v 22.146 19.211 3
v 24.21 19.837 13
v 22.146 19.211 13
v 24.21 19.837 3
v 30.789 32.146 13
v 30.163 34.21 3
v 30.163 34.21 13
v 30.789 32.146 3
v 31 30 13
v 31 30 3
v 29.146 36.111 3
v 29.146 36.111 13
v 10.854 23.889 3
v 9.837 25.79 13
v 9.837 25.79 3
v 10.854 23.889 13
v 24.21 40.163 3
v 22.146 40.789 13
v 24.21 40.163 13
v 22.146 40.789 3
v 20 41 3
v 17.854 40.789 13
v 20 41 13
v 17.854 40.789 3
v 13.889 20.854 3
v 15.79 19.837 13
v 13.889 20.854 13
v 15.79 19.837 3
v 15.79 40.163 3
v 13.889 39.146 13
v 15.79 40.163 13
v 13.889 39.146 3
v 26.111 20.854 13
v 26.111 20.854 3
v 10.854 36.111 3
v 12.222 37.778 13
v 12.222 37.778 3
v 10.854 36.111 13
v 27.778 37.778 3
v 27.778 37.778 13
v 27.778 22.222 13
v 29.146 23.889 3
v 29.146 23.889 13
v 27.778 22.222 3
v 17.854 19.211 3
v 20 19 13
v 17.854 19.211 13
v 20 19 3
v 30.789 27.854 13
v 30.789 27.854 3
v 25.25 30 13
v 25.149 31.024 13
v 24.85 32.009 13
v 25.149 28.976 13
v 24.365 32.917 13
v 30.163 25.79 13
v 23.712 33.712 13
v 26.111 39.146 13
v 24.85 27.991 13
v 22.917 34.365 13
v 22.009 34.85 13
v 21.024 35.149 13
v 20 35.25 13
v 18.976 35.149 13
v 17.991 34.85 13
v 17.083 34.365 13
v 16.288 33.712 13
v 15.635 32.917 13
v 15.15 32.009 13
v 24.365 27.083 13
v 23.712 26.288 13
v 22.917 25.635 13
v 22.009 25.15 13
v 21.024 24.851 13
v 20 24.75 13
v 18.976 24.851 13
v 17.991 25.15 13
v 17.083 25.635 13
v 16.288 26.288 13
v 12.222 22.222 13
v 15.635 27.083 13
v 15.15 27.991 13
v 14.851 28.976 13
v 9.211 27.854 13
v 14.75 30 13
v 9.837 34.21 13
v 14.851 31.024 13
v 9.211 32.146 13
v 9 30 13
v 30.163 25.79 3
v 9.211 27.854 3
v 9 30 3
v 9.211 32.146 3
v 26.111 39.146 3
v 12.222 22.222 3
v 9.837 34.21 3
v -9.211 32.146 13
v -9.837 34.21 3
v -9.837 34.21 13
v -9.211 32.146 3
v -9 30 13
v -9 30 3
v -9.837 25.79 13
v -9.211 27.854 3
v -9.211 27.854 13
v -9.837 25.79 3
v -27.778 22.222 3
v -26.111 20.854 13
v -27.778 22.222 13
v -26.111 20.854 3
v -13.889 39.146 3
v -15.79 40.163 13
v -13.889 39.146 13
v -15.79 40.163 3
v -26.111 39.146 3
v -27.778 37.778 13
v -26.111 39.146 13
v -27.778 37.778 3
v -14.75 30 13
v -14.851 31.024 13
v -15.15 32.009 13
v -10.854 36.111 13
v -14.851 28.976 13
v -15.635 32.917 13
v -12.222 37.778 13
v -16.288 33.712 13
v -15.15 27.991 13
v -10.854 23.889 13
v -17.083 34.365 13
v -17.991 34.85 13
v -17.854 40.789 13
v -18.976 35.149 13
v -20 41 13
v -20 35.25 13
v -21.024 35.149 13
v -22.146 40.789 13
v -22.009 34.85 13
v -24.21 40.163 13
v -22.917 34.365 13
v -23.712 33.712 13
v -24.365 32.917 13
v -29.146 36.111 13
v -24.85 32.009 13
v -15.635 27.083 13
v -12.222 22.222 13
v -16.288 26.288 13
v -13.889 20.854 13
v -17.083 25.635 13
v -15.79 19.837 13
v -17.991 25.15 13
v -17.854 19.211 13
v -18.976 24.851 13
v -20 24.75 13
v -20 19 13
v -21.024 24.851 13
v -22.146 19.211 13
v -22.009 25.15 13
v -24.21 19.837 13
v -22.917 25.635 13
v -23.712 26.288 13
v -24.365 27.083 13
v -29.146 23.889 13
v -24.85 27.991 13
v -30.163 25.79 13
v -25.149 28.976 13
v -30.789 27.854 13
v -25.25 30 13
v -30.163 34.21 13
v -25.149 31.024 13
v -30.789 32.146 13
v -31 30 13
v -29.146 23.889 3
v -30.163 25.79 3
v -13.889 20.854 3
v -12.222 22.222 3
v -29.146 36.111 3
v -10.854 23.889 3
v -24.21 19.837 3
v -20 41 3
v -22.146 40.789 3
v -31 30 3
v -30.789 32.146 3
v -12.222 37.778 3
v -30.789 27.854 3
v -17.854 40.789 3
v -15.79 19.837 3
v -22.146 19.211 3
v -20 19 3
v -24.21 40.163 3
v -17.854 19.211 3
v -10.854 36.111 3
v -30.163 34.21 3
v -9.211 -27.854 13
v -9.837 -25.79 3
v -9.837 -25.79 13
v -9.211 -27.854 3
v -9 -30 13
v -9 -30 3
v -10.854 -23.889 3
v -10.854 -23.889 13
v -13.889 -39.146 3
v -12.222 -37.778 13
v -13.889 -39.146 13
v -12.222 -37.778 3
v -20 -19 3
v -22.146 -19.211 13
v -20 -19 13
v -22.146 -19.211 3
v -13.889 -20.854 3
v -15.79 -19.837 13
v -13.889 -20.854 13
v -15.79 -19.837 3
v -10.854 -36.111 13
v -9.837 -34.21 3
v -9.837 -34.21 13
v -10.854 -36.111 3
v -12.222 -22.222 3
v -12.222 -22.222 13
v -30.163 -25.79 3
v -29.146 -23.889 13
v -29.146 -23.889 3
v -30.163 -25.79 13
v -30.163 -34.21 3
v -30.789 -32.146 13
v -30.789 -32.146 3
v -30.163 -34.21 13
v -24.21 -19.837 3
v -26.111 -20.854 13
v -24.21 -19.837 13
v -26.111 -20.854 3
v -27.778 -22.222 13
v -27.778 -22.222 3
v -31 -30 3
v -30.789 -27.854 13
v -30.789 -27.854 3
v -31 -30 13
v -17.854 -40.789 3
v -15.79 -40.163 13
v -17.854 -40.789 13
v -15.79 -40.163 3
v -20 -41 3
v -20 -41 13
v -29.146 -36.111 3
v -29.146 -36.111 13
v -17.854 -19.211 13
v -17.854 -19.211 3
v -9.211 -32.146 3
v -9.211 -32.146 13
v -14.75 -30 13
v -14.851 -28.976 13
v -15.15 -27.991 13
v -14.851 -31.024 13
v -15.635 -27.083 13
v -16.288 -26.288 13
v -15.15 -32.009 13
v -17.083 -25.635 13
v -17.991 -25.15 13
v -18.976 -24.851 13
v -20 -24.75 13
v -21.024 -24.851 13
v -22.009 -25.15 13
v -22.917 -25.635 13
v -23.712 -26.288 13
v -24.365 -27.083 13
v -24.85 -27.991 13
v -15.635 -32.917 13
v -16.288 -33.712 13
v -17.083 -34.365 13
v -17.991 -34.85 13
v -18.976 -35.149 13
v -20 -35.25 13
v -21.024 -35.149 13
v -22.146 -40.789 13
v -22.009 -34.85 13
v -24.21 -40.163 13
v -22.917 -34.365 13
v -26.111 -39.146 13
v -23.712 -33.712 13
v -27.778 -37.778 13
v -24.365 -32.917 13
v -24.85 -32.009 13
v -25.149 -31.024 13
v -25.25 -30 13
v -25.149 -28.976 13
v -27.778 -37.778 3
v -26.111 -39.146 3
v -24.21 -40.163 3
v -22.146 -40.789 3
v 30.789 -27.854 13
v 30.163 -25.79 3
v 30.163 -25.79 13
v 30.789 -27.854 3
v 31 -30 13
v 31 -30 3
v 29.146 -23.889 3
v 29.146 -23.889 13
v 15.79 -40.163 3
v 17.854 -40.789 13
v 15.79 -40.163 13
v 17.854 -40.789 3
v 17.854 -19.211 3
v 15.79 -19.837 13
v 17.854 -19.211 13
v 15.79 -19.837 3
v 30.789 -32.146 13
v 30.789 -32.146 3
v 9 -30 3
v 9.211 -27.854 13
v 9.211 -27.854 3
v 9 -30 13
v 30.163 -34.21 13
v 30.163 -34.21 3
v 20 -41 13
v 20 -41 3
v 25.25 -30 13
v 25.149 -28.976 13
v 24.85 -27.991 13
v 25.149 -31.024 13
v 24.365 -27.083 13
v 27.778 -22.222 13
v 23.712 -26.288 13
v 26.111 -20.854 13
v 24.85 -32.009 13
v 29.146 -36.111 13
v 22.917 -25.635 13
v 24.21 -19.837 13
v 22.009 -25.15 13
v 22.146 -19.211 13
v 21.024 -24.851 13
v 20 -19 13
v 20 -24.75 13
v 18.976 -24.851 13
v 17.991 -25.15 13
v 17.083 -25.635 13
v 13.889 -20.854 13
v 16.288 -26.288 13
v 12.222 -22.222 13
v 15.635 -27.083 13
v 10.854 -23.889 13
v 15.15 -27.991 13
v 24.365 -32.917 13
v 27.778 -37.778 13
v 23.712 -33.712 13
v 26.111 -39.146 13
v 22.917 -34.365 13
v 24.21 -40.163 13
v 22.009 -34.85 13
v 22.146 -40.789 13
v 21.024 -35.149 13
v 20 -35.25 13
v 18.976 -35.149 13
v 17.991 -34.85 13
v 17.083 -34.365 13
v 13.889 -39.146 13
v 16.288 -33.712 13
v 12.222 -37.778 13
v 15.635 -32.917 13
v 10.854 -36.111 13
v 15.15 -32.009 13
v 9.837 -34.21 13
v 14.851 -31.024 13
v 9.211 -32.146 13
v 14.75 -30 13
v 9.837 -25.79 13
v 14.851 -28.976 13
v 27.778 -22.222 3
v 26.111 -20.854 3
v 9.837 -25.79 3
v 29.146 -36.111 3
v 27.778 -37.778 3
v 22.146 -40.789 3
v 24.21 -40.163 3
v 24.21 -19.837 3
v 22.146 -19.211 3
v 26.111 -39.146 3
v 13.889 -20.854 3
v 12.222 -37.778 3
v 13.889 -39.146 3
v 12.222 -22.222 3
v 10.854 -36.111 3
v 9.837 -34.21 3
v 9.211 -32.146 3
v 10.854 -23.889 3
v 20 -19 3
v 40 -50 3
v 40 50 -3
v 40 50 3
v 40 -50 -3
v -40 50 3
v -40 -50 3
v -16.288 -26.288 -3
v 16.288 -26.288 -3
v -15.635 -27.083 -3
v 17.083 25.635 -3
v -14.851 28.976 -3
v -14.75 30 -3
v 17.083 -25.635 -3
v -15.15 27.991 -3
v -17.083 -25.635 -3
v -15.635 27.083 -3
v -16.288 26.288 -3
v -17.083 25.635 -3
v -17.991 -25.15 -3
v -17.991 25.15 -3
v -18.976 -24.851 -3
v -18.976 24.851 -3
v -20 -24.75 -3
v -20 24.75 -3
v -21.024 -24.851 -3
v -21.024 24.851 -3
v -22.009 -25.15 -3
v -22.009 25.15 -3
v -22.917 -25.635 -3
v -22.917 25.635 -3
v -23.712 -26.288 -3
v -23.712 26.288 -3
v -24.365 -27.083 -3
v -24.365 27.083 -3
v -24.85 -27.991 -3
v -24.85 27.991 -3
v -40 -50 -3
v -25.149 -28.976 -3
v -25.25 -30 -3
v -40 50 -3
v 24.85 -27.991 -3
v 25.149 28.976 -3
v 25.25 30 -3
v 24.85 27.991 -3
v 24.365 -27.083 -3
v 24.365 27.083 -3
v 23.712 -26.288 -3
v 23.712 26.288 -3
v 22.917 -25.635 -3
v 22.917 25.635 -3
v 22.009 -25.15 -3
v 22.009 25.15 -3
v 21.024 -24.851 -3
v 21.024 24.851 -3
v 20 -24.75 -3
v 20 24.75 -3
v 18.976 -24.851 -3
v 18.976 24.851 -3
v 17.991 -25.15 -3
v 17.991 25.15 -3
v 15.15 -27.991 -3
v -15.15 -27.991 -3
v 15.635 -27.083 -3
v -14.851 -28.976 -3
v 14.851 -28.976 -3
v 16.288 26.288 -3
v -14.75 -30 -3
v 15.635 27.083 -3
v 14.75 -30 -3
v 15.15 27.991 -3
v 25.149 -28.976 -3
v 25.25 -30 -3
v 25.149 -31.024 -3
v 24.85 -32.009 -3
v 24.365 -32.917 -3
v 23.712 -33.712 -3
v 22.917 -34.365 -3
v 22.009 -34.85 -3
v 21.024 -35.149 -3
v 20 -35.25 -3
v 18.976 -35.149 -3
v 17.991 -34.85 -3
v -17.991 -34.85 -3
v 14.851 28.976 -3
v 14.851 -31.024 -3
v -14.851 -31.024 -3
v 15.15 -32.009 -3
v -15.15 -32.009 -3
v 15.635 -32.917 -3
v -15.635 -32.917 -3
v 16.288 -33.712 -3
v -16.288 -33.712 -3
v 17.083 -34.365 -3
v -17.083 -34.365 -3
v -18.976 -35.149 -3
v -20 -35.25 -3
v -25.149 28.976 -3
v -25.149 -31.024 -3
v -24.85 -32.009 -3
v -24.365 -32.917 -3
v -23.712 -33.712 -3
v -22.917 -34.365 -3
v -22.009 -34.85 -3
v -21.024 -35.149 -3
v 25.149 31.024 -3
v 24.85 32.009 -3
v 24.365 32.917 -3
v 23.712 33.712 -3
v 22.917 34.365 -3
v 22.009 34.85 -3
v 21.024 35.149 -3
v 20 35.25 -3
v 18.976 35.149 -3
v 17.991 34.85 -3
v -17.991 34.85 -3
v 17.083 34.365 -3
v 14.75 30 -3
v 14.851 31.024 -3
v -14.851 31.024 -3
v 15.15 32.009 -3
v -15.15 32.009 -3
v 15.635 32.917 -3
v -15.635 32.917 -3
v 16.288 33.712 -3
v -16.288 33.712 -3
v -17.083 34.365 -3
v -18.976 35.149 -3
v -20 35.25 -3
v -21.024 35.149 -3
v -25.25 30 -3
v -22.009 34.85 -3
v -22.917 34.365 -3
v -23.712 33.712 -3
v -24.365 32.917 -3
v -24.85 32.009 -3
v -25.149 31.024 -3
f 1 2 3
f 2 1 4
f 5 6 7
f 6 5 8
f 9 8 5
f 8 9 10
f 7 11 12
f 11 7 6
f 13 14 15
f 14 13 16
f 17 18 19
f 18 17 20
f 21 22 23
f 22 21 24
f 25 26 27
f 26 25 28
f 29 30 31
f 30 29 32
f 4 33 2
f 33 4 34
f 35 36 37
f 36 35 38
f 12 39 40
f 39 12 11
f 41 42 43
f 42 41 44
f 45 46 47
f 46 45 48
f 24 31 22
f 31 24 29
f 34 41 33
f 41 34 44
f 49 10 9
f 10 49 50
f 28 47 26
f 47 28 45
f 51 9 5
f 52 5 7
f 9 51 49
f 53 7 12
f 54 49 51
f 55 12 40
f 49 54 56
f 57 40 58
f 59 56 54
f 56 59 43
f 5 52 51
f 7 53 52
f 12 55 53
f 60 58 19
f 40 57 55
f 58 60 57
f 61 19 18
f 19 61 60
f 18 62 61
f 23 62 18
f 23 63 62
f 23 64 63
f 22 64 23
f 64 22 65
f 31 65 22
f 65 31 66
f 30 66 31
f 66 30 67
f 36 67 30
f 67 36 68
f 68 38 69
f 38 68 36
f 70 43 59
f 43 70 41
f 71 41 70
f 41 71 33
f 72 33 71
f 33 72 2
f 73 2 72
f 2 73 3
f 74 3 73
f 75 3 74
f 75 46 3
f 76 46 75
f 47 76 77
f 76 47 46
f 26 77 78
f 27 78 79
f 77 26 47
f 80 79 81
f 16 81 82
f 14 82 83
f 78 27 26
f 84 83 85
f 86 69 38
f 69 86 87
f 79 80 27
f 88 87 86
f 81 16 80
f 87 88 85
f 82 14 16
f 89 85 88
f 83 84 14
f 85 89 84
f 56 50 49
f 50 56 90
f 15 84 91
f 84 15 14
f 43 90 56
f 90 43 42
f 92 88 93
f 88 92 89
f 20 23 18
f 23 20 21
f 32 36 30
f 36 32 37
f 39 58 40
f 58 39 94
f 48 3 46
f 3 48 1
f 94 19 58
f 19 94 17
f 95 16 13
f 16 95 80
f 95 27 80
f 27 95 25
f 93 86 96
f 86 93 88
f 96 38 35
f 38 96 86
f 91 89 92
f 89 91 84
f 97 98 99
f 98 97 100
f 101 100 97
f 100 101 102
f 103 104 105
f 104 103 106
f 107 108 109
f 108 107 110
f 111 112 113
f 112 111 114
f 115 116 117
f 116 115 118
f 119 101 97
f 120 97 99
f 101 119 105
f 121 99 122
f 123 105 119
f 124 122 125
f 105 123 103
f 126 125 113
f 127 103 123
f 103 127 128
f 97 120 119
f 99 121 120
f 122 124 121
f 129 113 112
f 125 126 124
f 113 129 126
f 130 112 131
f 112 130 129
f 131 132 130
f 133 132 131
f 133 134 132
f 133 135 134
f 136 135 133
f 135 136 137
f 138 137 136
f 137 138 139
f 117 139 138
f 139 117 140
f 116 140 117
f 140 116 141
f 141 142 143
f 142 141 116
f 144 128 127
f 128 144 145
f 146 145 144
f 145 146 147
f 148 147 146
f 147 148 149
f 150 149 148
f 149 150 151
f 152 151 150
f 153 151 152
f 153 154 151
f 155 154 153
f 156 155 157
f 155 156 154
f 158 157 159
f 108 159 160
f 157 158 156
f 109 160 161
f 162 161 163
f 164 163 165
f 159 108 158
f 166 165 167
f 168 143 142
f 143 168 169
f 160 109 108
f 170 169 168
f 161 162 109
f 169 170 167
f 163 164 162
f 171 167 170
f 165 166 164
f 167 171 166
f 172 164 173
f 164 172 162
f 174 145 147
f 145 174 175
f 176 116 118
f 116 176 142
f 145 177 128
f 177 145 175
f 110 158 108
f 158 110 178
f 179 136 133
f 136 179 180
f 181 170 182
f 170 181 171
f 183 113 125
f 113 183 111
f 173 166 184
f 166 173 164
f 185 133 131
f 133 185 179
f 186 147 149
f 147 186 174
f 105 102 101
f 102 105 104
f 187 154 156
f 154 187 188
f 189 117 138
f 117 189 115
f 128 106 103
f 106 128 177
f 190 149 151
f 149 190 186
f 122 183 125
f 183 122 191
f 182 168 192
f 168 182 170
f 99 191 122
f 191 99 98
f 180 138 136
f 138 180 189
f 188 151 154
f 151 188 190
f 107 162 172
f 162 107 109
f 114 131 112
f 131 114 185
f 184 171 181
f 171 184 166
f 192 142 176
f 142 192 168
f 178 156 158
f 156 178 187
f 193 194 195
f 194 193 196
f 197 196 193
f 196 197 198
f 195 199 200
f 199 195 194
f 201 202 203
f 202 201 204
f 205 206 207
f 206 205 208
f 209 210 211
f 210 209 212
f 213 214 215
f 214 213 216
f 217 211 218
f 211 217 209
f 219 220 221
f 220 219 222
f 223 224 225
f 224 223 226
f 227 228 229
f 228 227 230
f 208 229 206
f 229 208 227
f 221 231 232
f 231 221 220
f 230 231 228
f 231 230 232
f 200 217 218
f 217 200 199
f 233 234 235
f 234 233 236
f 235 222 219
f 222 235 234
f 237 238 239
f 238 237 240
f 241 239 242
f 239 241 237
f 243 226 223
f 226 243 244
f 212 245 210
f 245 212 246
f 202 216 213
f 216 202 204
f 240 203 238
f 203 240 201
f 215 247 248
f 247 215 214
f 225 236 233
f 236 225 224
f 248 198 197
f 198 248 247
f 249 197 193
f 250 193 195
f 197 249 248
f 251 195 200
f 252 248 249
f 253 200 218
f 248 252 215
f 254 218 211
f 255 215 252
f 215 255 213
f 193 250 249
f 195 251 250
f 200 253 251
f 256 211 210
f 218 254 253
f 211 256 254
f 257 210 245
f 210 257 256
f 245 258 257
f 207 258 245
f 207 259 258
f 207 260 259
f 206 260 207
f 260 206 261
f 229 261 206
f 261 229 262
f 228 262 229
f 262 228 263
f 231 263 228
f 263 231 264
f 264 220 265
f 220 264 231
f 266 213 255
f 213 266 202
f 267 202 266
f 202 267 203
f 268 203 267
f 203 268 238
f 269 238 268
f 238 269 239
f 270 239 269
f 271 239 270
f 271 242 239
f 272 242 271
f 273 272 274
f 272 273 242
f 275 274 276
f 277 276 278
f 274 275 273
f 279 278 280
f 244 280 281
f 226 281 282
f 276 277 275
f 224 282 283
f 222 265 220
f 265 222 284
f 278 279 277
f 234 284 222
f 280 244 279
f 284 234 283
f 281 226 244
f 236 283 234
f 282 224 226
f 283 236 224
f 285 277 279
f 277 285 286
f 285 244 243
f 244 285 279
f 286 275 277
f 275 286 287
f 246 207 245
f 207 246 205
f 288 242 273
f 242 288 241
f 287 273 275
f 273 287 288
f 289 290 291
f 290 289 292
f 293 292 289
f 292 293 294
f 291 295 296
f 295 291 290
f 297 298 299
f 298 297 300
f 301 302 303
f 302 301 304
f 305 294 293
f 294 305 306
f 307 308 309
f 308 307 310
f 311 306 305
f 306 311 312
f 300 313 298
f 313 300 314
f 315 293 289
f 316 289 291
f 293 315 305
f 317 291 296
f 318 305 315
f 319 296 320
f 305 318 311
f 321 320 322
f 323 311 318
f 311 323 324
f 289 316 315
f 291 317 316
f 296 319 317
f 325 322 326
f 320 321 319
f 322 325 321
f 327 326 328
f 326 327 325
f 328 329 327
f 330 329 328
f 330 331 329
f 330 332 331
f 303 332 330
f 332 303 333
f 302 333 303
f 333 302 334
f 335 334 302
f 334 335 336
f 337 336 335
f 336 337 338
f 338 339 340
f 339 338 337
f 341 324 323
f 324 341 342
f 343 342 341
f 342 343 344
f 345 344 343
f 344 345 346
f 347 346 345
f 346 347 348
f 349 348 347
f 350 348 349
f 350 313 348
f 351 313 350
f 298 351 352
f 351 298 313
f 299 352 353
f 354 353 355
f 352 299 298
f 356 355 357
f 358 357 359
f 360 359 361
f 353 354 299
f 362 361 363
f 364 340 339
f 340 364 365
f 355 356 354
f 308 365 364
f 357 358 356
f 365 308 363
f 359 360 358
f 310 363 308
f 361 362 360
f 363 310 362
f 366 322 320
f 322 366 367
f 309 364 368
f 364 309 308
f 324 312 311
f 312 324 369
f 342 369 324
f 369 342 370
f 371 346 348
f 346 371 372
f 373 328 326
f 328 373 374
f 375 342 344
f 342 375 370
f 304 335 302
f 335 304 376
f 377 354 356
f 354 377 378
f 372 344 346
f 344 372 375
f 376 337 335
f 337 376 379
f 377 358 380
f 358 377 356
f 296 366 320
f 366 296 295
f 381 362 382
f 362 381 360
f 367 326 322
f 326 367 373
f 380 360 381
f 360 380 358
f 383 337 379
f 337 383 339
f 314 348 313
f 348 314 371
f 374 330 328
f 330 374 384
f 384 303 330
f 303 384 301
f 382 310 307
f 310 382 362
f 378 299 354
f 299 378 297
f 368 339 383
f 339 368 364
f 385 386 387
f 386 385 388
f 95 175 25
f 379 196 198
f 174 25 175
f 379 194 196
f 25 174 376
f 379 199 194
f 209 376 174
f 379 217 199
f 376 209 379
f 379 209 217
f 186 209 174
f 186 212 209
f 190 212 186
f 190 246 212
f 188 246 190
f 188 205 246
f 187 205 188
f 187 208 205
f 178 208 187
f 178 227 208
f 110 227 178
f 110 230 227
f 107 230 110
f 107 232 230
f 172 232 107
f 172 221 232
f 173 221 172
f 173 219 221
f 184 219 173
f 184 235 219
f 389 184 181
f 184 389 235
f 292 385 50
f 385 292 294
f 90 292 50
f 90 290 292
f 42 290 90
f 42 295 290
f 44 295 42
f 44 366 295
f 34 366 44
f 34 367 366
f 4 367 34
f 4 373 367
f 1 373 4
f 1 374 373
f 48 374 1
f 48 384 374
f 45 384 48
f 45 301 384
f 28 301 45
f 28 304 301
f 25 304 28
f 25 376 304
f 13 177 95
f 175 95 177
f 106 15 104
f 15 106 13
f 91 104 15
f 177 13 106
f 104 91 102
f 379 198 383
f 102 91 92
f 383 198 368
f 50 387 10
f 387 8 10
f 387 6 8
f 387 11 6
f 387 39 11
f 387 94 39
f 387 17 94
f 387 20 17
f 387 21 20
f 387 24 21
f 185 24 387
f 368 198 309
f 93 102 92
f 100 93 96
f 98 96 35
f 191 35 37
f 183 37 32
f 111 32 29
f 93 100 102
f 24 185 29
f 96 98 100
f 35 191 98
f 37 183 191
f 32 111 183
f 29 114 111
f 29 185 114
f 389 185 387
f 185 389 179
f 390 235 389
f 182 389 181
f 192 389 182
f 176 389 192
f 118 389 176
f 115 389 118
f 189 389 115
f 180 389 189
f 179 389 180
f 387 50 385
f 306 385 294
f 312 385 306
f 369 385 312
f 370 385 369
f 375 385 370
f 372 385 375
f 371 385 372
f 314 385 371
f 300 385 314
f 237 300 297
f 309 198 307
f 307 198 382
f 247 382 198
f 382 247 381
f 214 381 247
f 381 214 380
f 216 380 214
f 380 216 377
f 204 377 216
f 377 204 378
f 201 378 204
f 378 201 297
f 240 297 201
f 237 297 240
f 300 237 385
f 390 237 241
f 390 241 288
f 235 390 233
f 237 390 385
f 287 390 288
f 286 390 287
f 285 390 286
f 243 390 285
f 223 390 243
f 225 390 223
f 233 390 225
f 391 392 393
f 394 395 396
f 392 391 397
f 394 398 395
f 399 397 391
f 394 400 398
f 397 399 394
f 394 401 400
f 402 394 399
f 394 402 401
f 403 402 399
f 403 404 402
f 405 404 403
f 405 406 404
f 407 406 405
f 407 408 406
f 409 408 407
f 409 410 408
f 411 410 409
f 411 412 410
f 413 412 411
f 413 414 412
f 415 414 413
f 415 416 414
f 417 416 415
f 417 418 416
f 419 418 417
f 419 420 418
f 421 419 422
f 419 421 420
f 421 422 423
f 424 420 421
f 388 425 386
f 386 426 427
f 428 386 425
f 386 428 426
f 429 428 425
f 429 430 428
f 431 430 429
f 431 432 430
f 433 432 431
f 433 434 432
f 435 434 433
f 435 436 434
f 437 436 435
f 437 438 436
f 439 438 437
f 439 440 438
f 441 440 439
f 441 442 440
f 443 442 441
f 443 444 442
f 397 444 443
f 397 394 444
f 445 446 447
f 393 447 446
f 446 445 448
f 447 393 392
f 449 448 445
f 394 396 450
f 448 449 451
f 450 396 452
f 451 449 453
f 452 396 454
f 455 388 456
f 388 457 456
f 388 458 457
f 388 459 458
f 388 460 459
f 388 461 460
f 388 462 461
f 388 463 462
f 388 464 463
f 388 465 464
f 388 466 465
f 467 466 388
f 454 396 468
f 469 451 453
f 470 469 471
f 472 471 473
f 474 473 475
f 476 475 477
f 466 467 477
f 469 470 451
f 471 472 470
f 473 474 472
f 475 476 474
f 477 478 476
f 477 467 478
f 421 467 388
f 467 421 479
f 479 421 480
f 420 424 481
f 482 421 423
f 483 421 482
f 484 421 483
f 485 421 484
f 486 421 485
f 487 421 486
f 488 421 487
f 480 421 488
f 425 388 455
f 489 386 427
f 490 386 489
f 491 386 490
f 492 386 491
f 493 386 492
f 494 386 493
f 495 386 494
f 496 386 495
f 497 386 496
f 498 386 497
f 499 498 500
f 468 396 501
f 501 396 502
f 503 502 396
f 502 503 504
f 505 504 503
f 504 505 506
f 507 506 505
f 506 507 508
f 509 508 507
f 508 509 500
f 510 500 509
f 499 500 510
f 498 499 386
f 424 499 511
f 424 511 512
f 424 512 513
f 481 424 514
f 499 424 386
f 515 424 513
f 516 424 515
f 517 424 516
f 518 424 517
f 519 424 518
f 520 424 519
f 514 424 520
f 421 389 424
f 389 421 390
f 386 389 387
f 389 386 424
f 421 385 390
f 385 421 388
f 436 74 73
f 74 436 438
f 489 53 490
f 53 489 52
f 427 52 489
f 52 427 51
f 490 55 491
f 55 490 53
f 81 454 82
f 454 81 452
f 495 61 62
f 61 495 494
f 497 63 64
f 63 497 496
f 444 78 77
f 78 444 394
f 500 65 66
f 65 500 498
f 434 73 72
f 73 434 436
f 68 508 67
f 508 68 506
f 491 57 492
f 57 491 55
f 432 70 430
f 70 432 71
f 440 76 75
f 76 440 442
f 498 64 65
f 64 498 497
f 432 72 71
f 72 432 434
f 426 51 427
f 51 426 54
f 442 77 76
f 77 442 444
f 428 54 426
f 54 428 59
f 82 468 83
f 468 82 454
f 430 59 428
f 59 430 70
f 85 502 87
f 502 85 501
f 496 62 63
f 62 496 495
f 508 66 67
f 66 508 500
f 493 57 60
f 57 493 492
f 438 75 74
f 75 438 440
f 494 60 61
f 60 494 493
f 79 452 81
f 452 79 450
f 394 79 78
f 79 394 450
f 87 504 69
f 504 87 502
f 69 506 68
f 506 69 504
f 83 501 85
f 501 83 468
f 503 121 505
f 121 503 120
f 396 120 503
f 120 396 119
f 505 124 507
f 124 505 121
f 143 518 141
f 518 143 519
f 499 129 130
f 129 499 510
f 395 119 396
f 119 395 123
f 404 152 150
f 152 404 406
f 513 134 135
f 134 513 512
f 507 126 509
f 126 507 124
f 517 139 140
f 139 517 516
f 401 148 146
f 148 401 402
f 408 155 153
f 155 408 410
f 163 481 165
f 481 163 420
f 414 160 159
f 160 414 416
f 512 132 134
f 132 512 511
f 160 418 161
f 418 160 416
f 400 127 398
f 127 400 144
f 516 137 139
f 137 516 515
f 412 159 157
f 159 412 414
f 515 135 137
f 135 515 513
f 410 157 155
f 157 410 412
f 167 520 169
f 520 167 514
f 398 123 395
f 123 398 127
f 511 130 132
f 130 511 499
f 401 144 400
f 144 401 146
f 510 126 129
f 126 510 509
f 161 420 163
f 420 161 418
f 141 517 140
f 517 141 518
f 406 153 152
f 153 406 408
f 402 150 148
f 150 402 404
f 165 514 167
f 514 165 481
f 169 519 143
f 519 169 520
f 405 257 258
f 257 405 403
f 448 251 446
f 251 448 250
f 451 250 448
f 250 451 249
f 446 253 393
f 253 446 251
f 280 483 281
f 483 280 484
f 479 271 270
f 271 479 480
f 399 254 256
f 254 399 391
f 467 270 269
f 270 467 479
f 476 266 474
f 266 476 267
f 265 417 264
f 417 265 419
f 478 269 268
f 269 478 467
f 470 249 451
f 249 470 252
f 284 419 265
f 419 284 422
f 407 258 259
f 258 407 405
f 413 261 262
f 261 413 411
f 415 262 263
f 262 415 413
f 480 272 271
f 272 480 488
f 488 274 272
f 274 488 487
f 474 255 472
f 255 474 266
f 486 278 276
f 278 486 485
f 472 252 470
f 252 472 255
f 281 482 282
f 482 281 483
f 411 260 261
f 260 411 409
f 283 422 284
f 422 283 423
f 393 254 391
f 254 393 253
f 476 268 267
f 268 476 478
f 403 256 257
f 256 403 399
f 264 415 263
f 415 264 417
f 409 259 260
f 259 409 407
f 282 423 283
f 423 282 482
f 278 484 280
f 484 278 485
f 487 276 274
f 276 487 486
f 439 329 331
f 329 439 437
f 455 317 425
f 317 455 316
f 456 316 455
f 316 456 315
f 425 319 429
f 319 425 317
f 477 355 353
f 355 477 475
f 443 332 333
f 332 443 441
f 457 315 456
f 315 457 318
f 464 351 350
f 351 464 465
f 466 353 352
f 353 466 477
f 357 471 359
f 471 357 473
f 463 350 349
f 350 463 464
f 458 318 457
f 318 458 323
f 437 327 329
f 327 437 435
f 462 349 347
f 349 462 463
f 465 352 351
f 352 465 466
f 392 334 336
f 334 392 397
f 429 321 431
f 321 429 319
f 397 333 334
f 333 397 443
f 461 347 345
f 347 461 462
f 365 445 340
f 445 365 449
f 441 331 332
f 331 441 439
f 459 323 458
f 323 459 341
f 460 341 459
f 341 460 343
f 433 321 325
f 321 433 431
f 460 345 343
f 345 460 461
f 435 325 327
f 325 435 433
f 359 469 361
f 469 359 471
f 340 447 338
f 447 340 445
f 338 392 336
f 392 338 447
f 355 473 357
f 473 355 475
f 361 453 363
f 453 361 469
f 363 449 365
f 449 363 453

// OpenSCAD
$fn = 32;

// ----------------------------------------------------------------------
// Anchor pads 80 x 100 x 16
// four corner bosses with anchor holes
// ----------------------------------------------------------------------

// --- parameters (mm) ---
plate = [80, 100, 6];  // base plate size (x, y, z)
pads = 4;              // boss count, one per corner
edge = 20;             // boss centre offset from the plate edge
boss_d = 22;           // boss diameter
boss_h = 10;           // boss height above the base plate
hole_d = 10.5;         // hole diameter

// --- derived feature positions (mm) ---
height = plate[2] + boss_h;      // = 16   overall height of the part
corner_x = plate[0] / 2 - edge;  // = 20   boss centre X
corner_y = plate[1] / 2 - edge;  // = 30   boss centre Y
feature_centers = [
  [corner_x, corner_y],
  [-corner_x, corner_y],
  [-corner_x, -corner_y],
  [corner_x, -corner_y]
];   // boss centres, anchor holes are drilled there

// base plate, four bosses standing on it, anchor holes all the way through
difference() {
  union() {
    cube(plate, center = true);
    for (centre = feature_centers)
      translate([centre[0], centre[1], plate[2] / 2 - 1])
        cylinder(d = boss_d, h = boss_h + 1);
  }
  for (centre = feature_centers)
    translate([centre[0], centre[1], -height])
      cylinder(d = hole_d, h = 2 * height + 2);  // through boss and plate
}
